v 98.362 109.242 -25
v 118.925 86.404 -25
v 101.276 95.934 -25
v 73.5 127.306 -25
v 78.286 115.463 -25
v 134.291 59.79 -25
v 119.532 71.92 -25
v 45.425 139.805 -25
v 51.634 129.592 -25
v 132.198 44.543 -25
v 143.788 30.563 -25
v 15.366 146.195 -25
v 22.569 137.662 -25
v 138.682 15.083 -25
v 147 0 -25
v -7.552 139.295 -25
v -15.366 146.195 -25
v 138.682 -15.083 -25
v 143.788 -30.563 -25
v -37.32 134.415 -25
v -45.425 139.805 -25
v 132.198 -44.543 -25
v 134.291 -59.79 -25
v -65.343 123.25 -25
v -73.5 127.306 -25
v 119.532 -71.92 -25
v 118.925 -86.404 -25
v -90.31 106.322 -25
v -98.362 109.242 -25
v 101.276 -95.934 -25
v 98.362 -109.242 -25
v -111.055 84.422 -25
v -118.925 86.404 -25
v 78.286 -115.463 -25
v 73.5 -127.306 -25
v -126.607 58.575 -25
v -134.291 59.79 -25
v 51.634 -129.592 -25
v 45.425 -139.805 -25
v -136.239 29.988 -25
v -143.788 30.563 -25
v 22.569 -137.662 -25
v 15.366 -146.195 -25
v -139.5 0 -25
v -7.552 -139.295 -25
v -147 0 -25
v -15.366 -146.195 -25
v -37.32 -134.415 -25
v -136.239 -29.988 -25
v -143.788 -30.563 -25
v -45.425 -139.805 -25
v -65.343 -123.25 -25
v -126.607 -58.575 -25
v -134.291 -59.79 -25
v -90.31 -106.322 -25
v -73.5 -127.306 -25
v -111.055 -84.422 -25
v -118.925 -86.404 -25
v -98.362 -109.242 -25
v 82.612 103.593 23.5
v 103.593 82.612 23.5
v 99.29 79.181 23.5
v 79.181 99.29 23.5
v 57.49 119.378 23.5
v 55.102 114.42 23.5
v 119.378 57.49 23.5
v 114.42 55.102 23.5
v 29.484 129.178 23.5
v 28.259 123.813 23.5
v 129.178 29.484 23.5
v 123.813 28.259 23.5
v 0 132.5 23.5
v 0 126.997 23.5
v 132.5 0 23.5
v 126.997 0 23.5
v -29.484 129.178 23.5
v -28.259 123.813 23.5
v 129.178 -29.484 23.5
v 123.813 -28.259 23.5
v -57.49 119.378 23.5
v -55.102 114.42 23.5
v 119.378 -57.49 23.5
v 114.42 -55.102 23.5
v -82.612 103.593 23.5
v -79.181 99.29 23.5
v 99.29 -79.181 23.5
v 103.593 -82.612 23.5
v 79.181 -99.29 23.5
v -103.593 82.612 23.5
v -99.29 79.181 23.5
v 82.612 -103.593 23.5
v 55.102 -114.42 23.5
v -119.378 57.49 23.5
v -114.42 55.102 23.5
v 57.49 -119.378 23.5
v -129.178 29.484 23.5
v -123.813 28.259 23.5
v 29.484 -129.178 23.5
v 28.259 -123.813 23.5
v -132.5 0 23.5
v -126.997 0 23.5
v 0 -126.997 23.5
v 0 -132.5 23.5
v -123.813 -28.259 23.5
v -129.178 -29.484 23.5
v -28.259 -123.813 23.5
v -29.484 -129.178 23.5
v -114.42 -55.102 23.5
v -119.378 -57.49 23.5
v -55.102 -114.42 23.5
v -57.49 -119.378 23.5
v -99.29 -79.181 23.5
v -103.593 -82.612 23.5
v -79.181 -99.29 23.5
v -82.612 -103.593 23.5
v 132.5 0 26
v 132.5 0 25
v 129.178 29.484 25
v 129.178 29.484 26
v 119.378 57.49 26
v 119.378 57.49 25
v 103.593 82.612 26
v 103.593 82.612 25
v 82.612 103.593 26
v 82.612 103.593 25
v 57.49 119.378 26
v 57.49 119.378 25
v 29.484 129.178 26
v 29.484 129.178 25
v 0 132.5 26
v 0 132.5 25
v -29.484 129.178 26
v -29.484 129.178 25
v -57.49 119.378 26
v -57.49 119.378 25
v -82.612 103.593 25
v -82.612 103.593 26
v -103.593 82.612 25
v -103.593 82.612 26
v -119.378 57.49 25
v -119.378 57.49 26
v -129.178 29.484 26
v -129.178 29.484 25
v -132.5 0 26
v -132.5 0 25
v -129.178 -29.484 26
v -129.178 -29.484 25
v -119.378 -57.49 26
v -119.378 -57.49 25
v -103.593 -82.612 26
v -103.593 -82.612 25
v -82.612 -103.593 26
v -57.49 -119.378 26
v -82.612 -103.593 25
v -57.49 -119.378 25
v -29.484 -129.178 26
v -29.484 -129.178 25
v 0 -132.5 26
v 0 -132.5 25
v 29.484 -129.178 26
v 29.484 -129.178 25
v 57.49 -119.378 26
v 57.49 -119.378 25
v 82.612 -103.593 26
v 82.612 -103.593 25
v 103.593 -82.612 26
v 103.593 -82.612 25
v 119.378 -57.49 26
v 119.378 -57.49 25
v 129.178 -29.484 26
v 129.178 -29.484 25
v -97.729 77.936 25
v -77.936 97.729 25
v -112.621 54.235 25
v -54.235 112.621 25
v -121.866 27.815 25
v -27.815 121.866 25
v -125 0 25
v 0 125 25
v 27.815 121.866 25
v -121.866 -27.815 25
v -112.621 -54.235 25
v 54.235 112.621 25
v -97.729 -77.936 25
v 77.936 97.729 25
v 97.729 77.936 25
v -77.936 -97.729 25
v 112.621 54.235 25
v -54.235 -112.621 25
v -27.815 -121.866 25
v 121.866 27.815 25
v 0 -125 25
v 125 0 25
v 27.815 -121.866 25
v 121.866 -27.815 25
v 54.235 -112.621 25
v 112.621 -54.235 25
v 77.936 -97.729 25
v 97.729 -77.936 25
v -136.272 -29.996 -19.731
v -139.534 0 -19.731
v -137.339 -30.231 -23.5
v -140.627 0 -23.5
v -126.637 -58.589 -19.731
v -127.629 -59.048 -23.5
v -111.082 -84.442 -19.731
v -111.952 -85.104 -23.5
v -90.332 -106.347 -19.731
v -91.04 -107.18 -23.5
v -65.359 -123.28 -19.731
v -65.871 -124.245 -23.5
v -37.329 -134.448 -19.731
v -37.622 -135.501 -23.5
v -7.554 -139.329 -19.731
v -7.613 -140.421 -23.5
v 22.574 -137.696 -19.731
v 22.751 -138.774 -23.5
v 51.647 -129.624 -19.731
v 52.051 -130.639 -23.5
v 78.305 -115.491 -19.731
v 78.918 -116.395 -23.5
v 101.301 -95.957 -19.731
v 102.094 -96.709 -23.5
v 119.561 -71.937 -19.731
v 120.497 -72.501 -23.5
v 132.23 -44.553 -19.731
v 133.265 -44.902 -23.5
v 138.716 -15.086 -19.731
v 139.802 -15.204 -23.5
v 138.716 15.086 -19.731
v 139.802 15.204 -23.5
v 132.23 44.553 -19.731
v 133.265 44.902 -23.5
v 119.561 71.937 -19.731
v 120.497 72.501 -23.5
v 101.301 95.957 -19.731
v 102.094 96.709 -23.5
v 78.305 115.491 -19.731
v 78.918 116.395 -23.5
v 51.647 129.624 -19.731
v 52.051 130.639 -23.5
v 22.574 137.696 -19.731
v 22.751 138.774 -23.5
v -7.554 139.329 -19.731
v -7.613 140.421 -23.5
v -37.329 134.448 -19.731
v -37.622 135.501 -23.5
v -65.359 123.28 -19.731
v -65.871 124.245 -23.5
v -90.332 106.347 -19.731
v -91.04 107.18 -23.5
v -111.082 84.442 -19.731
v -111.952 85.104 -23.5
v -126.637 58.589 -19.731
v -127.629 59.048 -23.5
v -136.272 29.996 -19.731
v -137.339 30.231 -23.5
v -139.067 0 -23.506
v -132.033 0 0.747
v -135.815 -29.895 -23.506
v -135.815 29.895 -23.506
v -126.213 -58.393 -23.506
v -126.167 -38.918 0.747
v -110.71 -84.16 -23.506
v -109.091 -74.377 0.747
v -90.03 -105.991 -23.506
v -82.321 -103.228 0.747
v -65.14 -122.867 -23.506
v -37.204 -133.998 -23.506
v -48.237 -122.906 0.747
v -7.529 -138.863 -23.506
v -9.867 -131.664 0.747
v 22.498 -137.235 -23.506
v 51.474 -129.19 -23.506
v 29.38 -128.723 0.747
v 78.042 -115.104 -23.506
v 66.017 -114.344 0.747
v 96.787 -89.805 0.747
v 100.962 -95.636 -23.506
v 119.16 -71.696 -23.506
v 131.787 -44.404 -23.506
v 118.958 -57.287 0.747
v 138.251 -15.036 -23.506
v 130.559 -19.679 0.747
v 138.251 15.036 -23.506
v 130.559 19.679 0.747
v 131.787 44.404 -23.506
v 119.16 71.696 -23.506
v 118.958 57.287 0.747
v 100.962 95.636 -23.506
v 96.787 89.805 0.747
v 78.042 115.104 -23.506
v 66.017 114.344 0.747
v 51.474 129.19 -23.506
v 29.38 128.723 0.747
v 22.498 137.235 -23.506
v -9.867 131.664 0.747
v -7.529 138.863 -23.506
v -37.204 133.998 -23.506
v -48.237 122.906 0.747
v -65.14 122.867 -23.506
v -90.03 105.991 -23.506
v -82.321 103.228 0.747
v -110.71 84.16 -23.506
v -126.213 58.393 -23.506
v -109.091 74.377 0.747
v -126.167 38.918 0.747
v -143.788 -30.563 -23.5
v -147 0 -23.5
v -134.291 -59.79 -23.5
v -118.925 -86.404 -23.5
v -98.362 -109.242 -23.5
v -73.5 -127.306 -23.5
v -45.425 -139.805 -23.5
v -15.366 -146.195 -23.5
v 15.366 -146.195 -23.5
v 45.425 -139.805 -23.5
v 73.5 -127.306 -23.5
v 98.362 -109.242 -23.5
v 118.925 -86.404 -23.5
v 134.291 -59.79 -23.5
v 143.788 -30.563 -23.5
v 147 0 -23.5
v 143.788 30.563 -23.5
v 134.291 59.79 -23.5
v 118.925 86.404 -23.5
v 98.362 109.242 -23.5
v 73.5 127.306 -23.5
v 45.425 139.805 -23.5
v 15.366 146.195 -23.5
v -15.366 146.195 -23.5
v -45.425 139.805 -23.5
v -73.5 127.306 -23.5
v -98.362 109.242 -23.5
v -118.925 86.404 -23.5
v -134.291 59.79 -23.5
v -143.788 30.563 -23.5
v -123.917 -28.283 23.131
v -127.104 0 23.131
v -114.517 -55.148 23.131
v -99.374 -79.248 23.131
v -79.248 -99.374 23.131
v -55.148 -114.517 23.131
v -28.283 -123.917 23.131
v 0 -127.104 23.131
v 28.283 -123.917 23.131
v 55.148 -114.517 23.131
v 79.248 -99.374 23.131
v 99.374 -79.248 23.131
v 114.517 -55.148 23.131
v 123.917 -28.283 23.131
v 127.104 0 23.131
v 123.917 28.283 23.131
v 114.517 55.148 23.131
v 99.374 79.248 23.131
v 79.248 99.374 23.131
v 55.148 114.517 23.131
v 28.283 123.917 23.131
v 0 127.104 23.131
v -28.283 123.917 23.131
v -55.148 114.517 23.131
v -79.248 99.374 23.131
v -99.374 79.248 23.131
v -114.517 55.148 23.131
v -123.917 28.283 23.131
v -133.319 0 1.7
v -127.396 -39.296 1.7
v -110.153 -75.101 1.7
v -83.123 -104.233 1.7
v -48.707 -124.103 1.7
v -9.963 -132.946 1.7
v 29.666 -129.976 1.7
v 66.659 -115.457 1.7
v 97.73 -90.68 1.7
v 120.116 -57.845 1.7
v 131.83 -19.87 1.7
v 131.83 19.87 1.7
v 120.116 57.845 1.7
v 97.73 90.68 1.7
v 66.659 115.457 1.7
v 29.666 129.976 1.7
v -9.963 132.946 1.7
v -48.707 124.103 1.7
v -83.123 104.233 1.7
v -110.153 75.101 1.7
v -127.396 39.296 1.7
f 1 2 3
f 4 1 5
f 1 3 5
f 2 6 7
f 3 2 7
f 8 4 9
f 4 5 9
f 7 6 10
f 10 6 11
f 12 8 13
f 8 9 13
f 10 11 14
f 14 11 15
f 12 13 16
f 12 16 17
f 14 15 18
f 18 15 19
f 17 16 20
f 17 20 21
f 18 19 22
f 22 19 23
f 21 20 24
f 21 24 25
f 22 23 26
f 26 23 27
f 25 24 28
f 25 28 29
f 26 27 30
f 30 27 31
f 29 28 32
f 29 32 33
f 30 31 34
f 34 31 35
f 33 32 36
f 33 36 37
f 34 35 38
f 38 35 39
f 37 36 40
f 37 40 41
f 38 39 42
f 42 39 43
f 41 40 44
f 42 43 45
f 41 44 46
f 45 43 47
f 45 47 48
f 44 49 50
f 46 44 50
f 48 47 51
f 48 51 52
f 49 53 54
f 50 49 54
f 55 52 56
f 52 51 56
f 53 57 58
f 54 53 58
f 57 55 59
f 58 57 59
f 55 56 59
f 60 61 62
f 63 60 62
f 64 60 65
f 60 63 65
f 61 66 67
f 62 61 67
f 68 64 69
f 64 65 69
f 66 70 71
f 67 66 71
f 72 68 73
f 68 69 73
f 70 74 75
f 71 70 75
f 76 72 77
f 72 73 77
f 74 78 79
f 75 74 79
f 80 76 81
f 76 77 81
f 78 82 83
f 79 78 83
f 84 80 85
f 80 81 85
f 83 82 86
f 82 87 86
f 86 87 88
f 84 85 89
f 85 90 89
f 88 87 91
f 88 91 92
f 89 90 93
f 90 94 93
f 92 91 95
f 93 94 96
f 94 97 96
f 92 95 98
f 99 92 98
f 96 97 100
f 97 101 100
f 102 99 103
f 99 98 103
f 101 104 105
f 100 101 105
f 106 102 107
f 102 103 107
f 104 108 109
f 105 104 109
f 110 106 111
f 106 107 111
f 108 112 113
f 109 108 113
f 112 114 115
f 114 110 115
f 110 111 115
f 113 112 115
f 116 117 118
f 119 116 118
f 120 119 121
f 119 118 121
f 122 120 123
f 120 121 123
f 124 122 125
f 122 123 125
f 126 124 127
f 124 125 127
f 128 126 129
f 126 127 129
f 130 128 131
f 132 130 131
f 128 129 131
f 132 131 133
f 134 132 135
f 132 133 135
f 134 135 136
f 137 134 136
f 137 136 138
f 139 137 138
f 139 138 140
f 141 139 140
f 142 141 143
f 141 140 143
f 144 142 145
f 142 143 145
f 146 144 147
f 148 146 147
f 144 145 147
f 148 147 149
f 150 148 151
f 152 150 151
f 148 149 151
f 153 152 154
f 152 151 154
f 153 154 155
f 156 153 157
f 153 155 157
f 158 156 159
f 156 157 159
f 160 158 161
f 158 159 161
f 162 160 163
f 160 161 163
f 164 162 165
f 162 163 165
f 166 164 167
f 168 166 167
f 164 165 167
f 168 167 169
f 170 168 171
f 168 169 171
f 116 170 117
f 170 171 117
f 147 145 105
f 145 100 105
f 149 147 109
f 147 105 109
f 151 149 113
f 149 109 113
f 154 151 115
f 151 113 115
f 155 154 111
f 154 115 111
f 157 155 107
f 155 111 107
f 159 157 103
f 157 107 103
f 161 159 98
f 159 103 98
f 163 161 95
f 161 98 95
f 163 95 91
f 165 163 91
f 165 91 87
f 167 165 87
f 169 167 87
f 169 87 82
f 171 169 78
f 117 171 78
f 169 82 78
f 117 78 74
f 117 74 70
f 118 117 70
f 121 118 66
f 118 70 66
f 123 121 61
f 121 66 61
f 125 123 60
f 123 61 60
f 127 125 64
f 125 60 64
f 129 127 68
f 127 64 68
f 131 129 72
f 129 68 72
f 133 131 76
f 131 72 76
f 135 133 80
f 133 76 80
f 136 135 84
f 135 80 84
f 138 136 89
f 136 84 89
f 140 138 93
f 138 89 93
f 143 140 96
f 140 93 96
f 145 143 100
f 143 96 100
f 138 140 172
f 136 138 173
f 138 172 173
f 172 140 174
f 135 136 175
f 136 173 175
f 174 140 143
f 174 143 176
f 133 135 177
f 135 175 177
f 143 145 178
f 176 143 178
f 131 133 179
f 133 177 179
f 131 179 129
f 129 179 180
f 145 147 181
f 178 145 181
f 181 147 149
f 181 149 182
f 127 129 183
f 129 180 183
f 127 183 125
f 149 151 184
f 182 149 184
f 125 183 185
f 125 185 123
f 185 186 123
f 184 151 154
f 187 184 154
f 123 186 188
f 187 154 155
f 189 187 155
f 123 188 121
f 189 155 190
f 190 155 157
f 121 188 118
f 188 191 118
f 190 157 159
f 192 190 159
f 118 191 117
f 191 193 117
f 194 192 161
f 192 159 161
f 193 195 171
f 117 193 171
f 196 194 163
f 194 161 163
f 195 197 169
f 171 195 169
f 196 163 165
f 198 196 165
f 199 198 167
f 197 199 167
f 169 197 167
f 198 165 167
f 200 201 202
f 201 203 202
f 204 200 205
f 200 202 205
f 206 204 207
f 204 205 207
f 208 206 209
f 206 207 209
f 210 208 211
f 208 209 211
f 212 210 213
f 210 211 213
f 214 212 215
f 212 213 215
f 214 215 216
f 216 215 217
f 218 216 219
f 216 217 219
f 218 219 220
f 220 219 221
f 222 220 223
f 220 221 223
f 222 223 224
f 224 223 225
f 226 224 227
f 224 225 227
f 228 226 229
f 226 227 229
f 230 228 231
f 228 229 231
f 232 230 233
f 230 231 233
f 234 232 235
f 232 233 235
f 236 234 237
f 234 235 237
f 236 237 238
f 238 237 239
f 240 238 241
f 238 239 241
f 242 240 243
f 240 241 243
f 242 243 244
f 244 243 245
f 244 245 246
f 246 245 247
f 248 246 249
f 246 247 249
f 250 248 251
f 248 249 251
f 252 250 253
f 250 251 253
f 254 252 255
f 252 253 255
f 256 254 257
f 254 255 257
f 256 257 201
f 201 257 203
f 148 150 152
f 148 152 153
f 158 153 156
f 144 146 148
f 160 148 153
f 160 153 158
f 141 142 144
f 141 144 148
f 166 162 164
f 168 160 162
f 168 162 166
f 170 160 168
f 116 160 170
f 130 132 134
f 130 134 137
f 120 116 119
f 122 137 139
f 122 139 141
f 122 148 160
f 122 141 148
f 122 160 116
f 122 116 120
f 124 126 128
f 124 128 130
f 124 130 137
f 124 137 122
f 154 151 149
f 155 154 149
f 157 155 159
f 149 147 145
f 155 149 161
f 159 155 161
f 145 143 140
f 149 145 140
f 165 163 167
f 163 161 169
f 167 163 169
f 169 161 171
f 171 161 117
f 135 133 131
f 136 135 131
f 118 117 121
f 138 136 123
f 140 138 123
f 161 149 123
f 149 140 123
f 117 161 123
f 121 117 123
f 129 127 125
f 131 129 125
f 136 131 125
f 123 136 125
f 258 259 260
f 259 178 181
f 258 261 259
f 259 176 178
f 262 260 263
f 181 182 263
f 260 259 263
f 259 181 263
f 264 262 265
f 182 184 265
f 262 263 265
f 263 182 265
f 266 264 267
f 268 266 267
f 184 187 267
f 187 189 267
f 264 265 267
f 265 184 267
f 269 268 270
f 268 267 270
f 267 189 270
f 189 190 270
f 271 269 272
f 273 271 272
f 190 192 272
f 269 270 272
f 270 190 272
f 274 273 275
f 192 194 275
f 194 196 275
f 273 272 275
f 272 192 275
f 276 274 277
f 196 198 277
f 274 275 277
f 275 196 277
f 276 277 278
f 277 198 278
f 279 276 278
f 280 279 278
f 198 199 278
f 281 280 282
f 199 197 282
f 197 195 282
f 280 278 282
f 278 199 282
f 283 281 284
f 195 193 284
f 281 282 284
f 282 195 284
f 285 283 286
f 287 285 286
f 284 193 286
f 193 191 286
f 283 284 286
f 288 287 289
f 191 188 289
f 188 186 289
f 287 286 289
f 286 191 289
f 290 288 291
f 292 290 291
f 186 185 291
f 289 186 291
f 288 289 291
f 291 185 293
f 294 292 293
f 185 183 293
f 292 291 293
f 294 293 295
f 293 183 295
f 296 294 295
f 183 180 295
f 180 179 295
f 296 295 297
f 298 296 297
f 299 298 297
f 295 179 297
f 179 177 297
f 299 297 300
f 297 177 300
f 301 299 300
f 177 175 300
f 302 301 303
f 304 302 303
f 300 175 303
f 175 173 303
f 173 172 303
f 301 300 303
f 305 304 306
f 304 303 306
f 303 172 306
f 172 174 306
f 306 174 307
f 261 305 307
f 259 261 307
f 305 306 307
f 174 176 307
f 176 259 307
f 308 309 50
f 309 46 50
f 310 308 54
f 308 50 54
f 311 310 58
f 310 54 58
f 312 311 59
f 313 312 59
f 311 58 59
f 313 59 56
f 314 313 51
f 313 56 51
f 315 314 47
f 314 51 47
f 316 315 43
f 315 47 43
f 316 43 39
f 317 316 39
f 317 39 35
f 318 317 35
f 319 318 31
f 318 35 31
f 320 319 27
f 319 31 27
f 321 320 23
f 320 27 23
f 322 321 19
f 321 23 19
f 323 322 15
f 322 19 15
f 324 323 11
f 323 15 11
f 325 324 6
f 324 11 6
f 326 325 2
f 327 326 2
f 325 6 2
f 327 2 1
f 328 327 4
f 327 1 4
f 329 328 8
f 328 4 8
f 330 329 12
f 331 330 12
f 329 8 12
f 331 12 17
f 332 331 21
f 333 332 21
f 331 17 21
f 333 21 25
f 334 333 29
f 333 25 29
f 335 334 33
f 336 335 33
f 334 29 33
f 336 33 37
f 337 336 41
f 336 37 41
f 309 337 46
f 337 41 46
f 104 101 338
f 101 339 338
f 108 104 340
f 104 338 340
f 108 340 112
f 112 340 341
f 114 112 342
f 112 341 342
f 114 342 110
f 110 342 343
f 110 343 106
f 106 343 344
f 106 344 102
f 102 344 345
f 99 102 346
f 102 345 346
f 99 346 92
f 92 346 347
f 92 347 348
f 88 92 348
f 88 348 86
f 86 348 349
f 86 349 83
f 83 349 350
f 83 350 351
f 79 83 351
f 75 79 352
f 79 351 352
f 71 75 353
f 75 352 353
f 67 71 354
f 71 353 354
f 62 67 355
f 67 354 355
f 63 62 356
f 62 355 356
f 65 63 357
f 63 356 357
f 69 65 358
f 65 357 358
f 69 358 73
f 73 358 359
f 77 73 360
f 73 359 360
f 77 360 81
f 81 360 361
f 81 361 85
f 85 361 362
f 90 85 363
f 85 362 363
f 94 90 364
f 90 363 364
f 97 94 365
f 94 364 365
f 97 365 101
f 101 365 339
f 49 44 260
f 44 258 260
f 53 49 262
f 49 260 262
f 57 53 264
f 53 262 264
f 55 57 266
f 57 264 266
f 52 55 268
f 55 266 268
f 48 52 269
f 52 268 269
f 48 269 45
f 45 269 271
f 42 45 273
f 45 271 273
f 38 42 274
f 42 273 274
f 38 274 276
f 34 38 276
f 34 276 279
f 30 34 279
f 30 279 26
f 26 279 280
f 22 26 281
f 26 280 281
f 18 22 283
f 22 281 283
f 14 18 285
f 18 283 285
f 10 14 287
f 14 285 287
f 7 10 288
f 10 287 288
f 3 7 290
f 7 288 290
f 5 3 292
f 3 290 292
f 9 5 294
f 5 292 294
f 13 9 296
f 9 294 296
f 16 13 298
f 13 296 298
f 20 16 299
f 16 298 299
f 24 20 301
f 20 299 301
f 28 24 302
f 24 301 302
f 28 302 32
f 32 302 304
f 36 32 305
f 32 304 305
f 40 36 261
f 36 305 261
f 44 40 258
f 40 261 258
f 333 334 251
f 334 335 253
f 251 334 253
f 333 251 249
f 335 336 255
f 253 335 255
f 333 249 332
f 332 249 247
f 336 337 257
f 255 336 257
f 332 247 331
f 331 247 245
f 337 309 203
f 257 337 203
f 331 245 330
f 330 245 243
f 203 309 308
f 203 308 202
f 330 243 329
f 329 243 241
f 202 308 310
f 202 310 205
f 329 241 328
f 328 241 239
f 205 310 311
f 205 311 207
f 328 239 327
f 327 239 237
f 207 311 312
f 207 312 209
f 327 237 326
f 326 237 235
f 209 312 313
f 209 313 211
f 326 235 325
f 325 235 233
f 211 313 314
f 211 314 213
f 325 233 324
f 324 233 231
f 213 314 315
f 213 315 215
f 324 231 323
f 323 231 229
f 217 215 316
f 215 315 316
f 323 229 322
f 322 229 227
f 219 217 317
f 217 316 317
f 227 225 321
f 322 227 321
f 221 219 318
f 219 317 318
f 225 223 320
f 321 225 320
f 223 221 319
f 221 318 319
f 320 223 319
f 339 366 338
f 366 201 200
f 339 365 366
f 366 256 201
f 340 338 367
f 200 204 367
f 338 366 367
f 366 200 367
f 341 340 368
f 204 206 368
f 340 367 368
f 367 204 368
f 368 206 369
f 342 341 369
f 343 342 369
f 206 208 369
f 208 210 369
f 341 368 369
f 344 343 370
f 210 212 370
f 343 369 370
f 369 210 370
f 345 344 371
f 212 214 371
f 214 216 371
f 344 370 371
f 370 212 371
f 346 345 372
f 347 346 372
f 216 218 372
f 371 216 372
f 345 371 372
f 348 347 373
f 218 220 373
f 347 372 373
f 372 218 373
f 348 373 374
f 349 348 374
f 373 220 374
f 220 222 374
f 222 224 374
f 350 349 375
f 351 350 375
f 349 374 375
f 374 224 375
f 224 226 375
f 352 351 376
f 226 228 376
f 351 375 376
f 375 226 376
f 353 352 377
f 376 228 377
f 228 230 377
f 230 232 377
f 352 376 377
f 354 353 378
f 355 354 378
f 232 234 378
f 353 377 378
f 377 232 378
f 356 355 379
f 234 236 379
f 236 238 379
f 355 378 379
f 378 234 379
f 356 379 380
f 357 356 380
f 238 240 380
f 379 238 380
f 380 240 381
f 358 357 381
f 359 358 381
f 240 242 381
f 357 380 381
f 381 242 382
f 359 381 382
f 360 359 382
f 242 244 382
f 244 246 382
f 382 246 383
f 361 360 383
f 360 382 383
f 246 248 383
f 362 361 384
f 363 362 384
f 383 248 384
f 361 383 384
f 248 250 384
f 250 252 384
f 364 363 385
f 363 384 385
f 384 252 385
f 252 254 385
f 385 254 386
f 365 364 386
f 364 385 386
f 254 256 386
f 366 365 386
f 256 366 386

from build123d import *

# Parameters (mm, degrees)
F2_R     = 132.5
F2_R_2   = 125
F3_DEPTH = 1


with BuildPart() as f1:
    # F0 (on Front) → F1 (revolve)
    with BuildSketch(Plane.XZ):
        Polygon((-147, -23.5), (-147, -25), (-139.5, -25), (-139.0666314375, -23.5056256464), (-125, 25), (-132.5, 25), (-132.5, 23.5), (-126.996801844, 23.5), (-127.1037506395, 23.13121105), (-139.5337813165, -19.7309636981), (-140.626801844, -23.5), align=None)
    revolve(axis=Axis((0, 0, 12.5), (0, 0, 1)))


with BuildPart() as f3:
    # F2 (on face) → F3 (new body)
    with BuildSketch(Plane.XY.offset(25)):
        Circle(F2_R)
        Circle(F2_R_2, mode=Mode.SUBTRACT)
        Circle(F2_R)
    extrude(amount=F3_DEPTH)


solid = Compound([f1.part, f3.part])
